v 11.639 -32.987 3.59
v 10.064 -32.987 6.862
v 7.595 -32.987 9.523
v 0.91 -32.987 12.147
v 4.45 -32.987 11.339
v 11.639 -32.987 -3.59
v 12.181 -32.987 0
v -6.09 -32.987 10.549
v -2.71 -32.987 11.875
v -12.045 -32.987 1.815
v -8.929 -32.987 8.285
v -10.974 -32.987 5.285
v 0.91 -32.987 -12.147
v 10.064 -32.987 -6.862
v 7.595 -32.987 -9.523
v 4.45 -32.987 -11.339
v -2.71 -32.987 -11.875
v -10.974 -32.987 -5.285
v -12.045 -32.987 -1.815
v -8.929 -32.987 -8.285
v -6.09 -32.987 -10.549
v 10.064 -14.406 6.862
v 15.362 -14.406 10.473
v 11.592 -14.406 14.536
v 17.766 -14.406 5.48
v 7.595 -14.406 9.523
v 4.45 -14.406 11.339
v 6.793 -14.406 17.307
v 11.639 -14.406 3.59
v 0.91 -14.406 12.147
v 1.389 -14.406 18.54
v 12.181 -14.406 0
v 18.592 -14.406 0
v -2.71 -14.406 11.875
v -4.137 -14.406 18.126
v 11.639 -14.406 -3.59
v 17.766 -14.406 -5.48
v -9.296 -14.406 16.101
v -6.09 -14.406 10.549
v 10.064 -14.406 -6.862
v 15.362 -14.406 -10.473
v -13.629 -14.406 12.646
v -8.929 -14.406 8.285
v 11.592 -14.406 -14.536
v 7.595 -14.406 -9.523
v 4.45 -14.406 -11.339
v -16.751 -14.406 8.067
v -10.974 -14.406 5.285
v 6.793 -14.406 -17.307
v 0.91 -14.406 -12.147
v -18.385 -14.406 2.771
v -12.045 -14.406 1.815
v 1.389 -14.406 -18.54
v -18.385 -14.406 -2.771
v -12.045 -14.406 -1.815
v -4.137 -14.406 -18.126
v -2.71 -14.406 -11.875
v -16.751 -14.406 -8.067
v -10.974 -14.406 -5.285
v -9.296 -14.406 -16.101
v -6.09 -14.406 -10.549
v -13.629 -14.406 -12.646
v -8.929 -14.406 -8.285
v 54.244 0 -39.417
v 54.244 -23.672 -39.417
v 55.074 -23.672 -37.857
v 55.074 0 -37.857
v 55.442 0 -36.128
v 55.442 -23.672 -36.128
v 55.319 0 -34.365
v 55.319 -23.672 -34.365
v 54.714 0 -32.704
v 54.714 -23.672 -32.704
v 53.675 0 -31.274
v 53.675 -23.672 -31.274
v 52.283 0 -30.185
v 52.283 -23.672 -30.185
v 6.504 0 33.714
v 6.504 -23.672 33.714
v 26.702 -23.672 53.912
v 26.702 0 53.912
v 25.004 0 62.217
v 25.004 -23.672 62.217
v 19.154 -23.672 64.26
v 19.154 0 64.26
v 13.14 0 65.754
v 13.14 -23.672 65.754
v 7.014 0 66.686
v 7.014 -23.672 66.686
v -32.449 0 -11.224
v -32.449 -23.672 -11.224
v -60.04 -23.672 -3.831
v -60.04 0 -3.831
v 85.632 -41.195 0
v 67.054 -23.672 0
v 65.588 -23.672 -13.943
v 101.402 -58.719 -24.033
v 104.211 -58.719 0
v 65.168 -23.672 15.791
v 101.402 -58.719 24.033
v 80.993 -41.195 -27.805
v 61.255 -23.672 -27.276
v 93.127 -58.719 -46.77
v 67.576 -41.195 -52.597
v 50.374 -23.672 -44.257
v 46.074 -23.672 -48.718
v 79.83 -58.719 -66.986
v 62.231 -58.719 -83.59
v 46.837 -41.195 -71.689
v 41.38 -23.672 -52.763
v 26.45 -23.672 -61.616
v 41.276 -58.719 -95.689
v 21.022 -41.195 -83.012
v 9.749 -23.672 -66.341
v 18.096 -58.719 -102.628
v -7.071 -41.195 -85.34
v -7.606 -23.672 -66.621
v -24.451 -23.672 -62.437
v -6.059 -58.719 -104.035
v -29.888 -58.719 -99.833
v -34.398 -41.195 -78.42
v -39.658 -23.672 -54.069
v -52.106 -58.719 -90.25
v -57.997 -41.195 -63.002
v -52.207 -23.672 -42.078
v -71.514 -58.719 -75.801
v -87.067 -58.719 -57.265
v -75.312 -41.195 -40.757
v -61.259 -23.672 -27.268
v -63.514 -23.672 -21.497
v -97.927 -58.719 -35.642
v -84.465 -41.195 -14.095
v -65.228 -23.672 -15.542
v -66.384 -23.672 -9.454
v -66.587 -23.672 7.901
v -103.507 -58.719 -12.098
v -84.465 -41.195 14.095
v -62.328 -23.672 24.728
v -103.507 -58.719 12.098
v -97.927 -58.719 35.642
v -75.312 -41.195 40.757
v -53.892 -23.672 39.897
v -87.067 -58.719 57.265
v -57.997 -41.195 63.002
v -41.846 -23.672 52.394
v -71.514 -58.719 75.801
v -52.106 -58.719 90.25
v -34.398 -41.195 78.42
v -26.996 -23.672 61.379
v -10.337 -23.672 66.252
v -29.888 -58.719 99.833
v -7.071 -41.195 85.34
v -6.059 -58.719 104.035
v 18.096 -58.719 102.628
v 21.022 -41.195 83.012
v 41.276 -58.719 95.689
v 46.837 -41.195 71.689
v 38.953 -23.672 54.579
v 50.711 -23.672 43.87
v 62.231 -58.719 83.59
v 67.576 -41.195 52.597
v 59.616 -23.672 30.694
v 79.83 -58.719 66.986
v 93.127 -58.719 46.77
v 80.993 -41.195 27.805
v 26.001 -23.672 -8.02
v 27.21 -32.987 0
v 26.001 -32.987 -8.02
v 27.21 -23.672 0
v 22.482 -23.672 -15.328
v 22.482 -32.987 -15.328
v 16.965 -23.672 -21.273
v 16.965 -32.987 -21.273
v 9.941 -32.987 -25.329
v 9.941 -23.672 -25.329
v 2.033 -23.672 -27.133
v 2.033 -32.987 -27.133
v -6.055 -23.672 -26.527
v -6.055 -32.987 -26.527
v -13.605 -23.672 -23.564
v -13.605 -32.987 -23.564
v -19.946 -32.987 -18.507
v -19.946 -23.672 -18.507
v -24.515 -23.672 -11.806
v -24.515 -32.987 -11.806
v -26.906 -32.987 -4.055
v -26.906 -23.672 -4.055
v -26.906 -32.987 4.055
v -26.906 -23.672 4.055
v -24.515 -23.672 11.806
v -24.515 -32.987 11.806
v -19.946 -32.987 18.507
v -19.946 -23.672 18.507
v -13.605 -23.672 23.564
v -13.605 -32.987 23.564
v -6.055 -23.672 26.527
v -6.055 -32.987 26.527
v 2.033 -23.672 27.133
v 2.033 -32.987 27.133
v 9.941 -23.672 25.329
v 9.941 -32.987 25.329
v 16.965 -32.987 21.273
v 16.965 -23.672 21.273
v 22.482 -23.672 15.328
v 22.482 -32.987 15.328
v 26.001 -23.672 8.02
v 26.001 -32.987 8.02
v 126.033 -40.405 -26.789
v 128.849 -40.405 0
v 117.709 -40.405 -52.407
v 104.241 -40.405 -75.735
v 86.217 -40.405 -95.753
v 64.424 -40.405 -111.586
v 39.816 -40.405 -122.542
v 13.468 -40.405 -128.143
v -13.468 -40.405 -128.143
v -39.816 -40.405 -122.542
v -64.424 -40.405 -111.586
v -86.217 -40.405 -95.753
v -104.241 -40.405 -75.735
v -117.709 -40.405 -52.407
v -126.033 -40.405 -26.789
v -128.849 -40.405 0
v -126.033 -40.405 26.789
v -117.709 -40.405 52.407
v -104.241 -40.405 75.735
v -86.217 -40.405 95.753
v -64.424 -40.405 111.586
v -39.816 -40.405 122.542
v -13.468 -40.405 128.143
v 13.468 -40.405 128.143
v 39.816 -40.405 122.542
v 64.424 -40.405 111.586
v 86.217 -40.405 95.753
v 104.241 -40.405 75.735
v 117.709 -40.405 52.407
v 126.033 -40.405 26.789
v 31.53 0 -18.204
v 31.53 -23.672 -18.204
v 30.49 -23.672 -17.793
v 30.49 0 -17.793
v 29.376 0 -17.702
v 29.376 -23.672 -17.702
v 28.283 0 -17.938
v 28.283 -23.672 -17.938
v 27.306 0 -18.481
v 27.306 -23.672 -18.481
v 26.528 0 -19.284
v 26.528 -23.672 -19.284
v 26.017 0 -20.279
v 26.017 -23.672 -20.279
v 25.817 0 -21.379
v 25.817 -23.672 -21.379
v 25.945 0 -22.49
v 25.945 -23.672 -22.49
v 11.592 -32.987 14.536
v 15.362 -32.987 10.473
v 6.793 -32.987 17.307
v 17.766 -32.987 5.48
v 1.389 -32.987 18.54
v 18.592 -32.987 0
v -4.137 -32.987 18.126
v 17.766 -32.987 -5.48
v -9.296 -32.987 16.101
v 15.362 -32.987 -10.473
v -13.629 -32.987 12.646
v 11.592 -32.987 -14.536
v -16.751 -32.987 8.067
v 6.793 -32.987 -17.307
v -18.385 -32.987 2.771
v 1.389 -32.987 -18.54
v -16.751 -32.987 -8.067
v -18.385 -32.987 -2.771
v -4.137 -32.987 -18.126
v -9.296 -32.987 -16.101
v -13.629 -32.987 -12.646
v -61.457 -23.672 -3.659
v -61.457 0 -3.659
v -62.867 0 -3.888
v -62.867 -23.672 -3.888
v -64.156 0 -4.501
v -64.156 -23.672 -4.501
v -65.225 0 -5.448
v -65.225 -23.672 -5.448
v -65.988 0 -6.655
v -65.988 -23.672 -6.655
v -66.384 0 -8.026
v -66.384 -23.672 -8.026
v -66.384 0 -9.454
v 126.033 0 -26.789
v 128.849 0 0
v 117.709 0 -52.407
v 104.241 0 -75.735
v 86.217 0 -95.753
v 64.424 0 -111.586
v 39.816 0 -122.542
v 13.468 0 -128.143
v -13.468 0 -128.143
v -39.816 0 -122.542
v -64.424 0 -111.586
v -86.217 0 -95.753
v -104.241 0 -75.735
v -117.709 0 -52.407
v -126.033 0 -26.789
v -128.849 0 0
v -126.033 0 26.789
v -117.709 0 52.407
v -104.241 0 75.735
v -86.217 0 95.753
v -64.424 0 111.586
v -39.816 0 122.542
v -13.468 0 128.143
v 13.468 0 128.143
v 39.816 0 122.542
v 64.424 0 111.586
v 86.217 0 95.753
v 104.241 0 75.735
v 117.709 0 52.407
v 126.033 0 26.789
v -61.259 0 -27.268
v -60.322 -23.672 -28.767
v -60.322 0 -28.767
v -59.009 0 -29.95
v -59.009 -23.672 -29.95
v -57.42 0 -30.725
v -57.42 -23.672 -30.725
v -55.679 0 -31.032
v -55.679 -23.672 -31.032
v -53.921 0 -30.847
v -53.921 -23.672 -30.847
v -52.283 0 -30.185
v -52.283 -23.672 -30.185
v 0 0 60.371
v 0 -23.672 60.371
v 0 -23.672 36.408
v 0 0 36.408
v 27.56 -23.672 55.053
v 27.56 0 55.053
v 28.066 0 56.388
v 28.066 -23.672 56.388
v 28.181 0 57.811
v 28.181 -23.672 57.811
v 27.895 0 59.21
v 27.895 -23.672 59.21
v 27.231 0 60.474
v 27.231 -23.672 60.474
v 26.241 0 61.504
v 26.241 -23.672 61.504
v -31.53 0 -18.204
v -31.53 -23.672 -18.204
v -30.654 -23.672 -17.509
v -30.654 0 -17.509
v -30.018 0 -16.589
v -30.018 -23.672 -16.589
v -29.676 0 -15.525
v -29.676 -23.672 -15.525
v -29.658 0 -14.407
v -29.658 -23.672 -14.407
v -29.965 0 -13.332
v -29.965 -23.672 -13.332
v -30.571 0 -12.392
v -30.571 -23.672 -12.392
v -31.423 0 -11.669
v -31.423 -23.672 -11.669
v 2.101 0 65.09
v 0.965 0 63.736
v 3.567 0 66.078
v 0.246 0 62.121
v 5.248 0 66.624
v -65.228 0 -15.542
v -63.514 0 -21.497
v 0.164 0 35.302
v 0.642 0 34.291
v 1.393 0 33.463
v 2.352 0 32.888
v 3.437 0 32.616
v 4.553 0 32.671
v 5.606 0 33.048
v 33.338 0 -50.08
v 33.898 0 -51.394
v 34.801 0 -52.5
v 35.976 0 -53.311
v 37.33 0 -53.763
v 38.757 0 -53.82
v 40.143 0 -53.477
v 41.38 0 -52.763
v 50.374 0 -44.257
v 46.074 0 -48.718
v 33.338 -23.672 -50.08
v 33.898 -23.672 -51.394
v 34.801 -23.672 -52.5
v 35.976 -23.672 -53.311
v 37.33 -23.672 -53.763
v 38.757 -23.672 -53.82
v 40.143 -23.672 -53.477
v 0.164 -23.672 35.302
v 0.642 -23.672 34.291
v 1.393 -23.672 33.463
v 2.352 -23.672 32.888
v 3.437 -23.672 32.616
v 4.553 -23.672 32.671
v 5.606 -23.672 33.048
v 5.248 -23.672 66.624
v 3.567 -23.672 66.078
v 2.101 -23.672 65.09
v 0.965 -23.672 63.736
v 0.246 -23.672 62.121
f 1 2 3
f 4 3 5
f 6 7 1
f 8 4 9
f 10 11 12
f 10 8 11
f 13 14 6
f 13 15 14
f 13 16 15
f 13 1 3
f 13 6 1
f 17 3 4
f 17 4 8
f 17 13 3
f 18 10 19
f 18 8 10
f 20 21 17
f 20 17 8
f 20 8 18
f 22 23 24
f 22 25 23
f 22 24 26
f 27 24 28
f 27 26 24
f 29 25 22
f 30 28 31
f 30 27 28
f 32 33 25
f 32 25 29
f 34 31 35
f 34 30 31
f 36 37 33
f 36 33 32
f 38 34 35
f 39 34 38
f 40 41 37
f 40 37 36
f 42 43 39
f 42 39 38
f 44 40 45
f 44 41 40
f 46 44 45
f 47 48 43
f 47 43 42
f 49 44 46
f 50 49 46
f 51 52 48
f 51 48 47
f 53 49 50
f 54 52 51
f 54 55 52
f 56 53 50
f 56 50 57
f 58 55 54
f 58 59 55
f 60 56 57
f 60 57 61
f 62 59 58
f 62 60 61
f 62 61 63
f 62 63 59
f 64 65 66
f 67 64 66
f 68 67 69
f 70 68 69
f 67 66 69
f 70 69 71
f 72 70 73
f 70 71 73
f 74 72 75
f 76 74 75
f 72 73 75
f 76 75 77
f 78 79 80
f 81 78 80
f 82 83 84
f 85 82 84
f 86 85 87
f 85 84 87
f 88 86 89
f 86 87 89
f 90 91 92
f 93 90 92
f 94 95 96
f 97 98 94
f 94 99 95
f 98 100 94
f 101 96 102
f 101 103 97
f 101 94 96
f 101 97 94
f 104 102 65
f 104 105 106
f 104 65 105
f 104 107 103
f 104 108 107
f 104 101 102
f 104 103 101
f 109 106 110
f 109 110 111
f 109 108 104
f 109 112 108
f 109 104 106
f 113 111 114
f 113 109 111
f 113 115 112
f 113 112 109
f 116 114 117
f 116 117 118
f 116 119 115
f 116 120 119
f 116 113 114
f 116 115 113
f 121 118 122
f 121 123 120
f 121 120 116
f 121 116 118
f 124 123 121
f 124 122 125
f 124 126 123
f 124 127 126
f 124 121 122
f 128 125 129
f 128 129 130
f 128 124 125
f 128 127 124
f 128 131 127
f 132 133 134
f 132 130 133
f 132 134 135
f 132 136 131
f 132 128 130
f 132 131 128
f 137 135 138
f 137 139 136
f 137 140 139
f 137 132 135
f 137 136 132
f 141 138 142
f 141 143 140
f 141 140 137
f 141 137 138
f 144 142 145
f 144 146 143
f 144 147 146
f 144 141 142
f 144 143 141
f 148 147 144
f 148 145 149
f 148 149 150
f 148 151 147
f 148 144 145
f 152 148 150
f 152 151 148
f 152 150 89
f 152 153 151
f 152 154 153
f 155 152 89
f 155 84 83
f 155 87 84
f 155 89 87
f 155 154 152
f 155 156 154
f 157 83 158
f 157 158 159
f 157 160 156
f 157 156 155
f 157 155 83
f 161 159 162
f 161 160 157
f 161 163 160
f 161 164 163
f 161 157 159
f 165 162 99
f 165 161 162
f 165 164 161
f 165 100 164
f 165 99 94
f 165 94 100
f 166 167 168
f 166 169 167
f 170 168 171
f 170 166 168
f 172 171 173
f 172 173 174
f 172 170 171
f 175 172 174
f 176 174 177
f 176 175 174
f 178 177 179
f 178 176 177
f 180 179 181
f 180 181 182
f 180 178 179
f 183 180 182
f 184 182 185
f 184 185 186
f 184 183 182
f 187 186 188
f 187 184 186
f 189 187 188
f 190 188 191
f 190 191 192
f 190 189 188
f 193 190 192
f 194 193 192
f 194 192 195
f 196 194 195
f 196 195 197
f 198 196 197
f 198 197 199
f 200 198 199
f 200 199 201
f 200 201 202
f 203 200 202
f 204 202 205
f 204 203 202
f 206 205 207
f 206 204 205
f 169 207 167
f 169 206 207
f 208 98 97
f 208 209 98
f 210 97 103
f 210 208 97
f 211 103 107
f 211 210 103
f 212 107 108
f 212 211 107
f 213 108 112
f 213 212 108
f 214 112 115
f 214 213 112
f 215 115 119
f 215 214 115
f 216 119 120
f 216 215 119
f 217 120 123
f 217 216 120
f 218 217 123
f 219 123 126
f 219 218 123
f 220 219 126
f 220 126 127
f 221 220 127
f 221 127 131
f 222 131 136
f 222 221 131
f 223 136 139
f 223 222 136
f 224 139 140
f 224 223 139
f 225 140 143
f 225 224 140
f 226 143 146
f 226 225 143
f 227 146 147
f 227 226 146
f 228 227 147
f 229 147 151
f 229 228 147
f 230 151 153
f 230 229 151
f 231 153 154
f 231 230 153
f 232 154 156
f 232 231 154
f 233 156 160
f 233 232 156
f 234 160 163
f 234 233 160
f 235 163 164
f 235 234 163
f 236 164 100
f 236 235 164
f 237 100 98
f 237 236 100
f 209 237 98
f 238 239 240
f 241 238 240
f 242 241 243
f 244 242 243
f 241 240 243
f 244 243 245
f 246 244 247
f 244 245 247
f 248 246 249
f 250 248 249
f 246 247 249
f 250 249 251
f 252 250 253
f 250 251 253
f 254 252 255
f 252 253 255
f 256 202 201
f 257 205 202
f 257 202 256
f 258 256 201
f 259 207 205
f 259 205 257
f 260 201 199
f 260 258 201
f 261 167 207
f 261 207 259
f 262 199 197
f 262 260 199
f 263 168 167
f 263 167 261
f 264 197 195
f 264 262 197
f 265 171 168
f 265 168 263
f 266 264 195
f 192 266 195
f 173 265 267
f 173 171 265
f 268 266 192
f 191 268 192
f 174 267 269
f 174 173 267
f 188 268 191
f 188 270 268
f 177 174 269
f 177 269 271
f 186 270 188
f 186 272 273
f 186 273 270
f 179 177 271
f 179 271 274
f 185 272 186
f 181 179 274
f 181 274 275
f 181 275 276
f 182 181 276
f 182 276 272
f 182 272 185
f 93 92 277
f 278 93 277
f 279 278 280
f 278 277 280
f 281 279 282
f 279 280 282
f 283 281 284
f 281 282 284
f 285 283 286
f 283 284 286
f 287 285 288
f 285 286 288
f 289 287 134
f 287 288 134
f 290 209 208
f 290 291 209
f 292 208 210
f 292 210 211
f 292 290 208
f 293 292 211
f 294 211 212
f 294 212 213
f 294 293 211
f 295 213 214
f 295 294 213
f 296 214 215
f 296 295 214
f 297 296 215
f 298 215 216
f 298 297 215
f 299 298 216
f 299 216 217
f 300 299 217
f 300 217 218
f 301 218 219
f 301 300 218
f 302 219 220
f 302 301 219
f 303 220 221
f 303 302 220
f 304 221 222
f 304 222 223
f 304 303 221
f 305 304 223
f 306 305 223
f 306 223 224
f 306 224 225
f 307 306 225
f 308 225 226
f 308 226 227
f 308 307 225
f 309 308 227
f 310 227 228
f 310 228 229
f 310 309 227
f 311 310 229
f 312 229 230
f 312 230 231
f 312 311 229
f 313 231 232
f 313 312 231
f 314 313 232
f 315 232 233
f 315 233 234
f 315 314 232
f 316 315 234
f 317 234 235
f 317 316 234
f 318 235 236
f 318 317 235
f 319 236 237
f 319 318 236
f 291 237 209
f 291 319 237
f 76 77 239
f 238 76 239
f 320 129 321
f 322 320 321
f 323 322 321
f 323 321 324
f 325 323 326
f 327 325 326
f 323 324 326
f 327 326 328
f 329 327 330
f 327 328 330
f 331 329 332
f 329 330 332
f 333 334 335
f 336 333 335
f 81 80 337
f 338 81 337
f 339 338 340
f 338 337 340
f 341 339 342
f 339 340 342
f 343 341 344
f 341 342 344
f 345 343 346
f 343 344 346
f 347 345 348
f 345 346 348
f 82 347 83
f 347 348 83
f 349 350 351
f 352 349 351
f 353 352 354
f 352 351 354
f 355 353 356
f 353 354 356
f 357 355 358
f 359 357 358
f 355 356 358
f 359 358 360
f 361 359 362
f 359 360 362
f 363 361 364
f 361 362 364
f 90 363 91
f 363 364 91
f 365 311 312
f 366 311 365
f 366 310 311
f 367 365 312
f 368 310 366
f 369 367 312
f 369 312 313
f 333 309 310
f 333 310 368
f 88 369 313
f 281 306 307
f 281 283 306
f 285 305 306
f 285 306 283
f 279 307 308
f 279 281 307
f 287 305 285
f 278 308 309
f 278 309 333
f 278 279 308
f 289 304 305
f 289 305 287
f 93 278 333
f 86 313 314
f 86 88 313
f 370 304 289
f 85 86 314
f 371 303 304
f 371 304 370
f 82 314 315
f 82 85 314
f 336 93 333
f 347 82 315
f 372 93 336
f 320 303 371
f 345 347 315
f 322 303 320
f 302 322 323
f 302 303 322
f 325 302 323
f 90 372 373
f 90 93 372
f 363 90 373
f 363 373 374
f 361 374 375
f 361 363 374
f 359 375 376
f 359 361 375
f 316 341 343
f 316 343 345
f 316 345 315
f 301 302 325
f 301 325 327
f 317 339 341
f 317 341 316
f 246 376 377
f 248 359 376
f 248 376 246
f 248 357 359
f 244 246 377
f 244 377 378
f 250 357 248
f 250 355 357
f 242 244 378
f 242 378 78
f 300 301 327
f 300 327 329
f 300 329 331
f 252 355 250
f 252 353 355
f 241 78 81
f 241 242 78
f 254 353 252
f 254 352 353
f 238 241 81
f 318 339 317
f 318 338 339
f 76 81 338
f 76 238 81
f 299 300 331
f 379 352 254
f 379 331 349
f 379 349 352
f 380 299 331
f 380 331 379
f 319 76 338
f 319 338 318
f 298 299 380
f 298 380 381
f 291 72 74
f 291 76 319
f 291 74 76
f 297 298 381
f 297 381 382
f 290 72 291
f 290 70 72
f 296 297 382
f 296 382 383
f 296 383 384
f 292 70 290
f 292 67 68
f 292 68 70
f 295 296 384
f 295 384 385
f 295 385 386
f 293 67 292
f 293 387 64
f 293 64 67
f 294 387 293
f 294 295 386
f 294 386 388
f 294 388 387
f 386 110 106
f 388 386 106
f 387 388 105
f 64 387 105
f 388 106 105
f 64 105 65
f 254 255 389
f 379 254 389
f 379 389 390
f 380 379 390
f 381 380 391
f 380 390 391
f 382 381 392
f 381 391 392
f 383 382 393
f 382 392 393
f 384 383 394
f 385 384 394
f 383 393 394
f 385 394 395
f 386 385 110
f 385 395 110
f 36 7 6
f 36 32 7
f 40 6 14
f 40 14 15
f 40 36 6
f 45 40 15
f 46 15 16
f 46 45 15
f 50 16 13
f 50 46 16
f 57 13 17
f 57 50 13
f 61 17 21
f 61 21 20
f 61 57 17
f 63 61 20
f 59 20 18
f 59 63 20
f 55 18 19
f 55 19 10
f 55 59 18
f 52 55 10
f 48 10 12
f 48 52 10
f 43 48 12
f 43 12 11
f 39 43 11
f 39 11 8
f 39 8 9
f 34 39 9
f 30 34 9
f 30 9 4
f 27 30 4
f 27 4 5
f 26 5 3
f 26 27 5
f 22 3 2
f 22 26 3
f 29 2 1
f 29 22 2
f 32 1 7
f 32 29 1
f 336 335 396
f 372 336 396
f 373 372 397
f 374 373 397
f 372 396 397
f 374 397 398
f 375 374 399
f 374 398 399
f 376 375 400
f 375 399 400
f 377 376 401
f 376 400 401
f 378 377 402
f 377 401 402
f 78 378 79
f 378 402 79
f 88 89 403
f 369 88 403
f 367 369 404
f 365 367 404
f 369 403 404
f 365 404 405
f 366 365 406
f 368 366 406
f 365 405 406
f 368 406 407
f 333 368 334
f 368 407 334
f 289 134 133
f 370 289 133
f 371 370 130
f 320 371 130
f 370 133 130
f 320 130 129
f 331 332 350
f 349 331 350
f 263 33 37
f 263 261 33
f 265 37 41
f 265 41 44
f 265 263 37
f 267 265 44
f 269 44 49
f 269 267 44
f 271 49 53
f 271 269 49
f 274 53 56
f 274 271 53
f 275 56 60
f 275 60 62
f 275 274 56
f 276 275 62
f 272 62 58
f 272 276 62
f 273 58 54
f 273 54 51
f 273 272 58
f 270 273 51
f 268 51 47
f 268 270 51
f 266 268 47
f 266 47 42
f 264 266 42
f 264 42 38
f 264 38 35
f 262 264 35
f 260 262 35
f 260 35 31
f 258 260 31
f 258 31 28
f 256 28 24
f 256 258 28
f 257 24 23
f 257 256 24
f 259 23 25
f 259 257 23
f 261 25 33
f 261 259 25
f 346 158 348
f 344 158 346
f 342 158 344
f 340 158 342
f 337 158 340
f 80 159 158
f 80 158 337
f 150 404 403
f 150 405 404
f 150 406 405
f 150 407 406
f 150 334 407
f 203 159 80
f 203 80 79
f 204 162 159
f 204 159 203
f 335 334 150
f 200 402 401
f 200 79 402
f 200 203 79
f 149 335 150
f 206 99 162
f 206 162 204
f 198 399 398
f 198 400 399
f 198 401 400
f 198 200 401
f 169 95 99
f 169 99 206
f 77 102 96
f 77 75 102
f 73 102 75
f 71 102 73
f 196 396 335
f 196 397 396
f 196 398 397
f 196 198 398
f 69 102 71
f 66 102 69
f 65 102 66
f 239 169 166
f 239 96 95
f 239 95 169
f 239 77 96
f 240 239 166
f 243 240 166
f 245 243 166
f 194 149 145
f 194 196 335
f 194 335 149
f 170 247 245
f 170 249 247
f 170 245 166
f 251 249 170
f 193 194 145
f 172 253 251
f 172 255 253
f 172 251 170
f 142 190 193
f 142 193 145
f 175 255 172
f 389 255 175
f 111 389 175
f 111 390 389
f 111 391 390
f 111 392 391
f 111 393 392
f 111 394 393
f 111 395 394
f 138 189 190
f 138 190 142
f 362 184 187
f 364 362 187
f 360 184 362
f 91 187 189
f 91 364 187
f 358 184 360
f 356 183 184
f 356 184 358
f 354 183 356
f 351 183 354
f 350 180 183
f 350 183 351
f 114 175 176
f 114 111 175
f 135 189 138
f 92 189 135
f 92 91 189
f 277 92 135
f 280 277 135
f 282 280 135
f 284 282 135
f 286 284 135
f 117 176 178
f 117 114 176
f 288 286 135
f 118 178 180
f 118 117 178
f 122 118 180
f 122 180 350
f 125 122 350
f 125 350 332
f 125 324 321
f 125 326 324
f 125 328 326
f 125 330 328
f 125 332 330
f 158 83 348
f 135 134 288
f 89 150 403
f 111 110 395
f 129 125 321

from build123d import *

# Parameters (mm, degrees)
F0_W     = 113.5605871677
F0_H     = 73.2877403498
F1_DEPTH = 254
F2_T     = -0.254
F7_DEPTH = 23.6716698855


with BuildPart() as f1:
    # F0 (on Top) → F1 (new body)
    with BuildSketch(Plane.XY):
        with Locations((-56.7802935839, 36.6438701749)):
            Rectangle(F0_W, F0_H)
    extrude(amount=F1_DEPTH)

    # F2
    f2_openings = [f1.faces().sort_by_distance(p)[0] for p in [
        (0, 36.64387, 127),
    ]]
    offset(amount=F2_T, openings=f2_openings)


with BuildPart() as f5:
    # F4 (on Top) → F5 (revolve)
    with BuildSketch(Plane.XY):
        Polygon((128.8485527039, 0), (0, 0), (0, -32.9870469868), (12.1806450188, -32.9870469868), (12.1806450188, -14.4056975842), (18.5923762619, -14.4056975842), (18.5923762619, -32.9870469868), (27.2095799446, -32.9870469868), (27.2095799446, -23.6716698855), (67.0536756516, -23.6716698855), (104.2113080621, -58.7185546756), (128.8485527039, -40.4047630727), align=None)
    revolve(axis=Axis((0, -16.4935234934, 0), (0, 1, 0)))

    # F6 (on face) → F7 (cut, through all)
    with BuildSketch(Plane.XZ.offset(23.6716698855)):
        with BuildLine():
            ThreePointArc((26.7019728343, 53.911552779), (28.0869530427, 58.521028427), (25.0041931016, 62.2172463688))
            ThreePointArc((25.0041931016, 62.2172463688), (16.1643801545, 65.0761725411), (7.0142513747, 66.6857983085))
            ThreePointArc((7.0142513747, 66.6857983085), (2.1012058316, 65.0897727595), (0, 60.3706363857))
            Line((0, 60.3706363857), (0, 36.4077336173))
            ThreePointArc((0, 36.4077336173), (2.3519761227, 32.8877525984), (6.5040768363, 33.7136567809))
            Line((6.5040768363, 33.7136567809), (26.7019728343, 53.911552779))
        make_face()
        with BuildLine():
            ThreePointArc((41.3796193581, -52.7628896115), (48.2754285244, -46.5368501208), (54.2444697194, -39.4174190332))
            ThreePointArc((54.2444697194, -39.4174190332), (55.3187938204, -34.3645840085), (52.2825047526, -30.1853181928))
            Line((52.2825047526, -30.1853181928), (31.5300222068, -18.2038668086))
            ThreePointArc((31.5300222068, -18.2038668086), (27.3056411622, -18.4807473705), (25.9448448086, -22.4895241589))
            Line((25.9448448086, -22.4895241589), (33.3377878469, -50.0803631952))
            ThreePointArc((33.3377878469, -50.0803631952), (36.6372207521, -53.5845290634), (41.3796193581, -52.7628896115))
        make_face()
        with BuildLine():
            ThreePointArc((-60.0397606812, -3.8311895838), (-64.7241737948, -4.9364993636), (-66.3838124597, -9.4543567573))
            ThreePointArc((-66.3838124597, -9.4543567573), (-64.4398086789, -18.5393224203), (-61.2587210941, -27.2683792752))
            ThreePointArc((-61.2587210941, -27.2683792752), (-57.4199996521, -30.725188751), (-52.2825047526, -30.1853181928))
            Line((-52.2825047526, -30.1853181928), (-31.5300222068, -18.2038668086))
            ThreePointArc((-31.5300222068, -18.2038668086), (-29.6576172849, -14.4070052278), (-32.4489216449, -11.224132622))
            Line((-32.4489216449, -11.224132622), (-60.0397606812, -3.8311895838))
        make_face()
    extrude(amount=-F7_DEPTH, mode=Mode.SUBTRACT)


solid = f5.part
